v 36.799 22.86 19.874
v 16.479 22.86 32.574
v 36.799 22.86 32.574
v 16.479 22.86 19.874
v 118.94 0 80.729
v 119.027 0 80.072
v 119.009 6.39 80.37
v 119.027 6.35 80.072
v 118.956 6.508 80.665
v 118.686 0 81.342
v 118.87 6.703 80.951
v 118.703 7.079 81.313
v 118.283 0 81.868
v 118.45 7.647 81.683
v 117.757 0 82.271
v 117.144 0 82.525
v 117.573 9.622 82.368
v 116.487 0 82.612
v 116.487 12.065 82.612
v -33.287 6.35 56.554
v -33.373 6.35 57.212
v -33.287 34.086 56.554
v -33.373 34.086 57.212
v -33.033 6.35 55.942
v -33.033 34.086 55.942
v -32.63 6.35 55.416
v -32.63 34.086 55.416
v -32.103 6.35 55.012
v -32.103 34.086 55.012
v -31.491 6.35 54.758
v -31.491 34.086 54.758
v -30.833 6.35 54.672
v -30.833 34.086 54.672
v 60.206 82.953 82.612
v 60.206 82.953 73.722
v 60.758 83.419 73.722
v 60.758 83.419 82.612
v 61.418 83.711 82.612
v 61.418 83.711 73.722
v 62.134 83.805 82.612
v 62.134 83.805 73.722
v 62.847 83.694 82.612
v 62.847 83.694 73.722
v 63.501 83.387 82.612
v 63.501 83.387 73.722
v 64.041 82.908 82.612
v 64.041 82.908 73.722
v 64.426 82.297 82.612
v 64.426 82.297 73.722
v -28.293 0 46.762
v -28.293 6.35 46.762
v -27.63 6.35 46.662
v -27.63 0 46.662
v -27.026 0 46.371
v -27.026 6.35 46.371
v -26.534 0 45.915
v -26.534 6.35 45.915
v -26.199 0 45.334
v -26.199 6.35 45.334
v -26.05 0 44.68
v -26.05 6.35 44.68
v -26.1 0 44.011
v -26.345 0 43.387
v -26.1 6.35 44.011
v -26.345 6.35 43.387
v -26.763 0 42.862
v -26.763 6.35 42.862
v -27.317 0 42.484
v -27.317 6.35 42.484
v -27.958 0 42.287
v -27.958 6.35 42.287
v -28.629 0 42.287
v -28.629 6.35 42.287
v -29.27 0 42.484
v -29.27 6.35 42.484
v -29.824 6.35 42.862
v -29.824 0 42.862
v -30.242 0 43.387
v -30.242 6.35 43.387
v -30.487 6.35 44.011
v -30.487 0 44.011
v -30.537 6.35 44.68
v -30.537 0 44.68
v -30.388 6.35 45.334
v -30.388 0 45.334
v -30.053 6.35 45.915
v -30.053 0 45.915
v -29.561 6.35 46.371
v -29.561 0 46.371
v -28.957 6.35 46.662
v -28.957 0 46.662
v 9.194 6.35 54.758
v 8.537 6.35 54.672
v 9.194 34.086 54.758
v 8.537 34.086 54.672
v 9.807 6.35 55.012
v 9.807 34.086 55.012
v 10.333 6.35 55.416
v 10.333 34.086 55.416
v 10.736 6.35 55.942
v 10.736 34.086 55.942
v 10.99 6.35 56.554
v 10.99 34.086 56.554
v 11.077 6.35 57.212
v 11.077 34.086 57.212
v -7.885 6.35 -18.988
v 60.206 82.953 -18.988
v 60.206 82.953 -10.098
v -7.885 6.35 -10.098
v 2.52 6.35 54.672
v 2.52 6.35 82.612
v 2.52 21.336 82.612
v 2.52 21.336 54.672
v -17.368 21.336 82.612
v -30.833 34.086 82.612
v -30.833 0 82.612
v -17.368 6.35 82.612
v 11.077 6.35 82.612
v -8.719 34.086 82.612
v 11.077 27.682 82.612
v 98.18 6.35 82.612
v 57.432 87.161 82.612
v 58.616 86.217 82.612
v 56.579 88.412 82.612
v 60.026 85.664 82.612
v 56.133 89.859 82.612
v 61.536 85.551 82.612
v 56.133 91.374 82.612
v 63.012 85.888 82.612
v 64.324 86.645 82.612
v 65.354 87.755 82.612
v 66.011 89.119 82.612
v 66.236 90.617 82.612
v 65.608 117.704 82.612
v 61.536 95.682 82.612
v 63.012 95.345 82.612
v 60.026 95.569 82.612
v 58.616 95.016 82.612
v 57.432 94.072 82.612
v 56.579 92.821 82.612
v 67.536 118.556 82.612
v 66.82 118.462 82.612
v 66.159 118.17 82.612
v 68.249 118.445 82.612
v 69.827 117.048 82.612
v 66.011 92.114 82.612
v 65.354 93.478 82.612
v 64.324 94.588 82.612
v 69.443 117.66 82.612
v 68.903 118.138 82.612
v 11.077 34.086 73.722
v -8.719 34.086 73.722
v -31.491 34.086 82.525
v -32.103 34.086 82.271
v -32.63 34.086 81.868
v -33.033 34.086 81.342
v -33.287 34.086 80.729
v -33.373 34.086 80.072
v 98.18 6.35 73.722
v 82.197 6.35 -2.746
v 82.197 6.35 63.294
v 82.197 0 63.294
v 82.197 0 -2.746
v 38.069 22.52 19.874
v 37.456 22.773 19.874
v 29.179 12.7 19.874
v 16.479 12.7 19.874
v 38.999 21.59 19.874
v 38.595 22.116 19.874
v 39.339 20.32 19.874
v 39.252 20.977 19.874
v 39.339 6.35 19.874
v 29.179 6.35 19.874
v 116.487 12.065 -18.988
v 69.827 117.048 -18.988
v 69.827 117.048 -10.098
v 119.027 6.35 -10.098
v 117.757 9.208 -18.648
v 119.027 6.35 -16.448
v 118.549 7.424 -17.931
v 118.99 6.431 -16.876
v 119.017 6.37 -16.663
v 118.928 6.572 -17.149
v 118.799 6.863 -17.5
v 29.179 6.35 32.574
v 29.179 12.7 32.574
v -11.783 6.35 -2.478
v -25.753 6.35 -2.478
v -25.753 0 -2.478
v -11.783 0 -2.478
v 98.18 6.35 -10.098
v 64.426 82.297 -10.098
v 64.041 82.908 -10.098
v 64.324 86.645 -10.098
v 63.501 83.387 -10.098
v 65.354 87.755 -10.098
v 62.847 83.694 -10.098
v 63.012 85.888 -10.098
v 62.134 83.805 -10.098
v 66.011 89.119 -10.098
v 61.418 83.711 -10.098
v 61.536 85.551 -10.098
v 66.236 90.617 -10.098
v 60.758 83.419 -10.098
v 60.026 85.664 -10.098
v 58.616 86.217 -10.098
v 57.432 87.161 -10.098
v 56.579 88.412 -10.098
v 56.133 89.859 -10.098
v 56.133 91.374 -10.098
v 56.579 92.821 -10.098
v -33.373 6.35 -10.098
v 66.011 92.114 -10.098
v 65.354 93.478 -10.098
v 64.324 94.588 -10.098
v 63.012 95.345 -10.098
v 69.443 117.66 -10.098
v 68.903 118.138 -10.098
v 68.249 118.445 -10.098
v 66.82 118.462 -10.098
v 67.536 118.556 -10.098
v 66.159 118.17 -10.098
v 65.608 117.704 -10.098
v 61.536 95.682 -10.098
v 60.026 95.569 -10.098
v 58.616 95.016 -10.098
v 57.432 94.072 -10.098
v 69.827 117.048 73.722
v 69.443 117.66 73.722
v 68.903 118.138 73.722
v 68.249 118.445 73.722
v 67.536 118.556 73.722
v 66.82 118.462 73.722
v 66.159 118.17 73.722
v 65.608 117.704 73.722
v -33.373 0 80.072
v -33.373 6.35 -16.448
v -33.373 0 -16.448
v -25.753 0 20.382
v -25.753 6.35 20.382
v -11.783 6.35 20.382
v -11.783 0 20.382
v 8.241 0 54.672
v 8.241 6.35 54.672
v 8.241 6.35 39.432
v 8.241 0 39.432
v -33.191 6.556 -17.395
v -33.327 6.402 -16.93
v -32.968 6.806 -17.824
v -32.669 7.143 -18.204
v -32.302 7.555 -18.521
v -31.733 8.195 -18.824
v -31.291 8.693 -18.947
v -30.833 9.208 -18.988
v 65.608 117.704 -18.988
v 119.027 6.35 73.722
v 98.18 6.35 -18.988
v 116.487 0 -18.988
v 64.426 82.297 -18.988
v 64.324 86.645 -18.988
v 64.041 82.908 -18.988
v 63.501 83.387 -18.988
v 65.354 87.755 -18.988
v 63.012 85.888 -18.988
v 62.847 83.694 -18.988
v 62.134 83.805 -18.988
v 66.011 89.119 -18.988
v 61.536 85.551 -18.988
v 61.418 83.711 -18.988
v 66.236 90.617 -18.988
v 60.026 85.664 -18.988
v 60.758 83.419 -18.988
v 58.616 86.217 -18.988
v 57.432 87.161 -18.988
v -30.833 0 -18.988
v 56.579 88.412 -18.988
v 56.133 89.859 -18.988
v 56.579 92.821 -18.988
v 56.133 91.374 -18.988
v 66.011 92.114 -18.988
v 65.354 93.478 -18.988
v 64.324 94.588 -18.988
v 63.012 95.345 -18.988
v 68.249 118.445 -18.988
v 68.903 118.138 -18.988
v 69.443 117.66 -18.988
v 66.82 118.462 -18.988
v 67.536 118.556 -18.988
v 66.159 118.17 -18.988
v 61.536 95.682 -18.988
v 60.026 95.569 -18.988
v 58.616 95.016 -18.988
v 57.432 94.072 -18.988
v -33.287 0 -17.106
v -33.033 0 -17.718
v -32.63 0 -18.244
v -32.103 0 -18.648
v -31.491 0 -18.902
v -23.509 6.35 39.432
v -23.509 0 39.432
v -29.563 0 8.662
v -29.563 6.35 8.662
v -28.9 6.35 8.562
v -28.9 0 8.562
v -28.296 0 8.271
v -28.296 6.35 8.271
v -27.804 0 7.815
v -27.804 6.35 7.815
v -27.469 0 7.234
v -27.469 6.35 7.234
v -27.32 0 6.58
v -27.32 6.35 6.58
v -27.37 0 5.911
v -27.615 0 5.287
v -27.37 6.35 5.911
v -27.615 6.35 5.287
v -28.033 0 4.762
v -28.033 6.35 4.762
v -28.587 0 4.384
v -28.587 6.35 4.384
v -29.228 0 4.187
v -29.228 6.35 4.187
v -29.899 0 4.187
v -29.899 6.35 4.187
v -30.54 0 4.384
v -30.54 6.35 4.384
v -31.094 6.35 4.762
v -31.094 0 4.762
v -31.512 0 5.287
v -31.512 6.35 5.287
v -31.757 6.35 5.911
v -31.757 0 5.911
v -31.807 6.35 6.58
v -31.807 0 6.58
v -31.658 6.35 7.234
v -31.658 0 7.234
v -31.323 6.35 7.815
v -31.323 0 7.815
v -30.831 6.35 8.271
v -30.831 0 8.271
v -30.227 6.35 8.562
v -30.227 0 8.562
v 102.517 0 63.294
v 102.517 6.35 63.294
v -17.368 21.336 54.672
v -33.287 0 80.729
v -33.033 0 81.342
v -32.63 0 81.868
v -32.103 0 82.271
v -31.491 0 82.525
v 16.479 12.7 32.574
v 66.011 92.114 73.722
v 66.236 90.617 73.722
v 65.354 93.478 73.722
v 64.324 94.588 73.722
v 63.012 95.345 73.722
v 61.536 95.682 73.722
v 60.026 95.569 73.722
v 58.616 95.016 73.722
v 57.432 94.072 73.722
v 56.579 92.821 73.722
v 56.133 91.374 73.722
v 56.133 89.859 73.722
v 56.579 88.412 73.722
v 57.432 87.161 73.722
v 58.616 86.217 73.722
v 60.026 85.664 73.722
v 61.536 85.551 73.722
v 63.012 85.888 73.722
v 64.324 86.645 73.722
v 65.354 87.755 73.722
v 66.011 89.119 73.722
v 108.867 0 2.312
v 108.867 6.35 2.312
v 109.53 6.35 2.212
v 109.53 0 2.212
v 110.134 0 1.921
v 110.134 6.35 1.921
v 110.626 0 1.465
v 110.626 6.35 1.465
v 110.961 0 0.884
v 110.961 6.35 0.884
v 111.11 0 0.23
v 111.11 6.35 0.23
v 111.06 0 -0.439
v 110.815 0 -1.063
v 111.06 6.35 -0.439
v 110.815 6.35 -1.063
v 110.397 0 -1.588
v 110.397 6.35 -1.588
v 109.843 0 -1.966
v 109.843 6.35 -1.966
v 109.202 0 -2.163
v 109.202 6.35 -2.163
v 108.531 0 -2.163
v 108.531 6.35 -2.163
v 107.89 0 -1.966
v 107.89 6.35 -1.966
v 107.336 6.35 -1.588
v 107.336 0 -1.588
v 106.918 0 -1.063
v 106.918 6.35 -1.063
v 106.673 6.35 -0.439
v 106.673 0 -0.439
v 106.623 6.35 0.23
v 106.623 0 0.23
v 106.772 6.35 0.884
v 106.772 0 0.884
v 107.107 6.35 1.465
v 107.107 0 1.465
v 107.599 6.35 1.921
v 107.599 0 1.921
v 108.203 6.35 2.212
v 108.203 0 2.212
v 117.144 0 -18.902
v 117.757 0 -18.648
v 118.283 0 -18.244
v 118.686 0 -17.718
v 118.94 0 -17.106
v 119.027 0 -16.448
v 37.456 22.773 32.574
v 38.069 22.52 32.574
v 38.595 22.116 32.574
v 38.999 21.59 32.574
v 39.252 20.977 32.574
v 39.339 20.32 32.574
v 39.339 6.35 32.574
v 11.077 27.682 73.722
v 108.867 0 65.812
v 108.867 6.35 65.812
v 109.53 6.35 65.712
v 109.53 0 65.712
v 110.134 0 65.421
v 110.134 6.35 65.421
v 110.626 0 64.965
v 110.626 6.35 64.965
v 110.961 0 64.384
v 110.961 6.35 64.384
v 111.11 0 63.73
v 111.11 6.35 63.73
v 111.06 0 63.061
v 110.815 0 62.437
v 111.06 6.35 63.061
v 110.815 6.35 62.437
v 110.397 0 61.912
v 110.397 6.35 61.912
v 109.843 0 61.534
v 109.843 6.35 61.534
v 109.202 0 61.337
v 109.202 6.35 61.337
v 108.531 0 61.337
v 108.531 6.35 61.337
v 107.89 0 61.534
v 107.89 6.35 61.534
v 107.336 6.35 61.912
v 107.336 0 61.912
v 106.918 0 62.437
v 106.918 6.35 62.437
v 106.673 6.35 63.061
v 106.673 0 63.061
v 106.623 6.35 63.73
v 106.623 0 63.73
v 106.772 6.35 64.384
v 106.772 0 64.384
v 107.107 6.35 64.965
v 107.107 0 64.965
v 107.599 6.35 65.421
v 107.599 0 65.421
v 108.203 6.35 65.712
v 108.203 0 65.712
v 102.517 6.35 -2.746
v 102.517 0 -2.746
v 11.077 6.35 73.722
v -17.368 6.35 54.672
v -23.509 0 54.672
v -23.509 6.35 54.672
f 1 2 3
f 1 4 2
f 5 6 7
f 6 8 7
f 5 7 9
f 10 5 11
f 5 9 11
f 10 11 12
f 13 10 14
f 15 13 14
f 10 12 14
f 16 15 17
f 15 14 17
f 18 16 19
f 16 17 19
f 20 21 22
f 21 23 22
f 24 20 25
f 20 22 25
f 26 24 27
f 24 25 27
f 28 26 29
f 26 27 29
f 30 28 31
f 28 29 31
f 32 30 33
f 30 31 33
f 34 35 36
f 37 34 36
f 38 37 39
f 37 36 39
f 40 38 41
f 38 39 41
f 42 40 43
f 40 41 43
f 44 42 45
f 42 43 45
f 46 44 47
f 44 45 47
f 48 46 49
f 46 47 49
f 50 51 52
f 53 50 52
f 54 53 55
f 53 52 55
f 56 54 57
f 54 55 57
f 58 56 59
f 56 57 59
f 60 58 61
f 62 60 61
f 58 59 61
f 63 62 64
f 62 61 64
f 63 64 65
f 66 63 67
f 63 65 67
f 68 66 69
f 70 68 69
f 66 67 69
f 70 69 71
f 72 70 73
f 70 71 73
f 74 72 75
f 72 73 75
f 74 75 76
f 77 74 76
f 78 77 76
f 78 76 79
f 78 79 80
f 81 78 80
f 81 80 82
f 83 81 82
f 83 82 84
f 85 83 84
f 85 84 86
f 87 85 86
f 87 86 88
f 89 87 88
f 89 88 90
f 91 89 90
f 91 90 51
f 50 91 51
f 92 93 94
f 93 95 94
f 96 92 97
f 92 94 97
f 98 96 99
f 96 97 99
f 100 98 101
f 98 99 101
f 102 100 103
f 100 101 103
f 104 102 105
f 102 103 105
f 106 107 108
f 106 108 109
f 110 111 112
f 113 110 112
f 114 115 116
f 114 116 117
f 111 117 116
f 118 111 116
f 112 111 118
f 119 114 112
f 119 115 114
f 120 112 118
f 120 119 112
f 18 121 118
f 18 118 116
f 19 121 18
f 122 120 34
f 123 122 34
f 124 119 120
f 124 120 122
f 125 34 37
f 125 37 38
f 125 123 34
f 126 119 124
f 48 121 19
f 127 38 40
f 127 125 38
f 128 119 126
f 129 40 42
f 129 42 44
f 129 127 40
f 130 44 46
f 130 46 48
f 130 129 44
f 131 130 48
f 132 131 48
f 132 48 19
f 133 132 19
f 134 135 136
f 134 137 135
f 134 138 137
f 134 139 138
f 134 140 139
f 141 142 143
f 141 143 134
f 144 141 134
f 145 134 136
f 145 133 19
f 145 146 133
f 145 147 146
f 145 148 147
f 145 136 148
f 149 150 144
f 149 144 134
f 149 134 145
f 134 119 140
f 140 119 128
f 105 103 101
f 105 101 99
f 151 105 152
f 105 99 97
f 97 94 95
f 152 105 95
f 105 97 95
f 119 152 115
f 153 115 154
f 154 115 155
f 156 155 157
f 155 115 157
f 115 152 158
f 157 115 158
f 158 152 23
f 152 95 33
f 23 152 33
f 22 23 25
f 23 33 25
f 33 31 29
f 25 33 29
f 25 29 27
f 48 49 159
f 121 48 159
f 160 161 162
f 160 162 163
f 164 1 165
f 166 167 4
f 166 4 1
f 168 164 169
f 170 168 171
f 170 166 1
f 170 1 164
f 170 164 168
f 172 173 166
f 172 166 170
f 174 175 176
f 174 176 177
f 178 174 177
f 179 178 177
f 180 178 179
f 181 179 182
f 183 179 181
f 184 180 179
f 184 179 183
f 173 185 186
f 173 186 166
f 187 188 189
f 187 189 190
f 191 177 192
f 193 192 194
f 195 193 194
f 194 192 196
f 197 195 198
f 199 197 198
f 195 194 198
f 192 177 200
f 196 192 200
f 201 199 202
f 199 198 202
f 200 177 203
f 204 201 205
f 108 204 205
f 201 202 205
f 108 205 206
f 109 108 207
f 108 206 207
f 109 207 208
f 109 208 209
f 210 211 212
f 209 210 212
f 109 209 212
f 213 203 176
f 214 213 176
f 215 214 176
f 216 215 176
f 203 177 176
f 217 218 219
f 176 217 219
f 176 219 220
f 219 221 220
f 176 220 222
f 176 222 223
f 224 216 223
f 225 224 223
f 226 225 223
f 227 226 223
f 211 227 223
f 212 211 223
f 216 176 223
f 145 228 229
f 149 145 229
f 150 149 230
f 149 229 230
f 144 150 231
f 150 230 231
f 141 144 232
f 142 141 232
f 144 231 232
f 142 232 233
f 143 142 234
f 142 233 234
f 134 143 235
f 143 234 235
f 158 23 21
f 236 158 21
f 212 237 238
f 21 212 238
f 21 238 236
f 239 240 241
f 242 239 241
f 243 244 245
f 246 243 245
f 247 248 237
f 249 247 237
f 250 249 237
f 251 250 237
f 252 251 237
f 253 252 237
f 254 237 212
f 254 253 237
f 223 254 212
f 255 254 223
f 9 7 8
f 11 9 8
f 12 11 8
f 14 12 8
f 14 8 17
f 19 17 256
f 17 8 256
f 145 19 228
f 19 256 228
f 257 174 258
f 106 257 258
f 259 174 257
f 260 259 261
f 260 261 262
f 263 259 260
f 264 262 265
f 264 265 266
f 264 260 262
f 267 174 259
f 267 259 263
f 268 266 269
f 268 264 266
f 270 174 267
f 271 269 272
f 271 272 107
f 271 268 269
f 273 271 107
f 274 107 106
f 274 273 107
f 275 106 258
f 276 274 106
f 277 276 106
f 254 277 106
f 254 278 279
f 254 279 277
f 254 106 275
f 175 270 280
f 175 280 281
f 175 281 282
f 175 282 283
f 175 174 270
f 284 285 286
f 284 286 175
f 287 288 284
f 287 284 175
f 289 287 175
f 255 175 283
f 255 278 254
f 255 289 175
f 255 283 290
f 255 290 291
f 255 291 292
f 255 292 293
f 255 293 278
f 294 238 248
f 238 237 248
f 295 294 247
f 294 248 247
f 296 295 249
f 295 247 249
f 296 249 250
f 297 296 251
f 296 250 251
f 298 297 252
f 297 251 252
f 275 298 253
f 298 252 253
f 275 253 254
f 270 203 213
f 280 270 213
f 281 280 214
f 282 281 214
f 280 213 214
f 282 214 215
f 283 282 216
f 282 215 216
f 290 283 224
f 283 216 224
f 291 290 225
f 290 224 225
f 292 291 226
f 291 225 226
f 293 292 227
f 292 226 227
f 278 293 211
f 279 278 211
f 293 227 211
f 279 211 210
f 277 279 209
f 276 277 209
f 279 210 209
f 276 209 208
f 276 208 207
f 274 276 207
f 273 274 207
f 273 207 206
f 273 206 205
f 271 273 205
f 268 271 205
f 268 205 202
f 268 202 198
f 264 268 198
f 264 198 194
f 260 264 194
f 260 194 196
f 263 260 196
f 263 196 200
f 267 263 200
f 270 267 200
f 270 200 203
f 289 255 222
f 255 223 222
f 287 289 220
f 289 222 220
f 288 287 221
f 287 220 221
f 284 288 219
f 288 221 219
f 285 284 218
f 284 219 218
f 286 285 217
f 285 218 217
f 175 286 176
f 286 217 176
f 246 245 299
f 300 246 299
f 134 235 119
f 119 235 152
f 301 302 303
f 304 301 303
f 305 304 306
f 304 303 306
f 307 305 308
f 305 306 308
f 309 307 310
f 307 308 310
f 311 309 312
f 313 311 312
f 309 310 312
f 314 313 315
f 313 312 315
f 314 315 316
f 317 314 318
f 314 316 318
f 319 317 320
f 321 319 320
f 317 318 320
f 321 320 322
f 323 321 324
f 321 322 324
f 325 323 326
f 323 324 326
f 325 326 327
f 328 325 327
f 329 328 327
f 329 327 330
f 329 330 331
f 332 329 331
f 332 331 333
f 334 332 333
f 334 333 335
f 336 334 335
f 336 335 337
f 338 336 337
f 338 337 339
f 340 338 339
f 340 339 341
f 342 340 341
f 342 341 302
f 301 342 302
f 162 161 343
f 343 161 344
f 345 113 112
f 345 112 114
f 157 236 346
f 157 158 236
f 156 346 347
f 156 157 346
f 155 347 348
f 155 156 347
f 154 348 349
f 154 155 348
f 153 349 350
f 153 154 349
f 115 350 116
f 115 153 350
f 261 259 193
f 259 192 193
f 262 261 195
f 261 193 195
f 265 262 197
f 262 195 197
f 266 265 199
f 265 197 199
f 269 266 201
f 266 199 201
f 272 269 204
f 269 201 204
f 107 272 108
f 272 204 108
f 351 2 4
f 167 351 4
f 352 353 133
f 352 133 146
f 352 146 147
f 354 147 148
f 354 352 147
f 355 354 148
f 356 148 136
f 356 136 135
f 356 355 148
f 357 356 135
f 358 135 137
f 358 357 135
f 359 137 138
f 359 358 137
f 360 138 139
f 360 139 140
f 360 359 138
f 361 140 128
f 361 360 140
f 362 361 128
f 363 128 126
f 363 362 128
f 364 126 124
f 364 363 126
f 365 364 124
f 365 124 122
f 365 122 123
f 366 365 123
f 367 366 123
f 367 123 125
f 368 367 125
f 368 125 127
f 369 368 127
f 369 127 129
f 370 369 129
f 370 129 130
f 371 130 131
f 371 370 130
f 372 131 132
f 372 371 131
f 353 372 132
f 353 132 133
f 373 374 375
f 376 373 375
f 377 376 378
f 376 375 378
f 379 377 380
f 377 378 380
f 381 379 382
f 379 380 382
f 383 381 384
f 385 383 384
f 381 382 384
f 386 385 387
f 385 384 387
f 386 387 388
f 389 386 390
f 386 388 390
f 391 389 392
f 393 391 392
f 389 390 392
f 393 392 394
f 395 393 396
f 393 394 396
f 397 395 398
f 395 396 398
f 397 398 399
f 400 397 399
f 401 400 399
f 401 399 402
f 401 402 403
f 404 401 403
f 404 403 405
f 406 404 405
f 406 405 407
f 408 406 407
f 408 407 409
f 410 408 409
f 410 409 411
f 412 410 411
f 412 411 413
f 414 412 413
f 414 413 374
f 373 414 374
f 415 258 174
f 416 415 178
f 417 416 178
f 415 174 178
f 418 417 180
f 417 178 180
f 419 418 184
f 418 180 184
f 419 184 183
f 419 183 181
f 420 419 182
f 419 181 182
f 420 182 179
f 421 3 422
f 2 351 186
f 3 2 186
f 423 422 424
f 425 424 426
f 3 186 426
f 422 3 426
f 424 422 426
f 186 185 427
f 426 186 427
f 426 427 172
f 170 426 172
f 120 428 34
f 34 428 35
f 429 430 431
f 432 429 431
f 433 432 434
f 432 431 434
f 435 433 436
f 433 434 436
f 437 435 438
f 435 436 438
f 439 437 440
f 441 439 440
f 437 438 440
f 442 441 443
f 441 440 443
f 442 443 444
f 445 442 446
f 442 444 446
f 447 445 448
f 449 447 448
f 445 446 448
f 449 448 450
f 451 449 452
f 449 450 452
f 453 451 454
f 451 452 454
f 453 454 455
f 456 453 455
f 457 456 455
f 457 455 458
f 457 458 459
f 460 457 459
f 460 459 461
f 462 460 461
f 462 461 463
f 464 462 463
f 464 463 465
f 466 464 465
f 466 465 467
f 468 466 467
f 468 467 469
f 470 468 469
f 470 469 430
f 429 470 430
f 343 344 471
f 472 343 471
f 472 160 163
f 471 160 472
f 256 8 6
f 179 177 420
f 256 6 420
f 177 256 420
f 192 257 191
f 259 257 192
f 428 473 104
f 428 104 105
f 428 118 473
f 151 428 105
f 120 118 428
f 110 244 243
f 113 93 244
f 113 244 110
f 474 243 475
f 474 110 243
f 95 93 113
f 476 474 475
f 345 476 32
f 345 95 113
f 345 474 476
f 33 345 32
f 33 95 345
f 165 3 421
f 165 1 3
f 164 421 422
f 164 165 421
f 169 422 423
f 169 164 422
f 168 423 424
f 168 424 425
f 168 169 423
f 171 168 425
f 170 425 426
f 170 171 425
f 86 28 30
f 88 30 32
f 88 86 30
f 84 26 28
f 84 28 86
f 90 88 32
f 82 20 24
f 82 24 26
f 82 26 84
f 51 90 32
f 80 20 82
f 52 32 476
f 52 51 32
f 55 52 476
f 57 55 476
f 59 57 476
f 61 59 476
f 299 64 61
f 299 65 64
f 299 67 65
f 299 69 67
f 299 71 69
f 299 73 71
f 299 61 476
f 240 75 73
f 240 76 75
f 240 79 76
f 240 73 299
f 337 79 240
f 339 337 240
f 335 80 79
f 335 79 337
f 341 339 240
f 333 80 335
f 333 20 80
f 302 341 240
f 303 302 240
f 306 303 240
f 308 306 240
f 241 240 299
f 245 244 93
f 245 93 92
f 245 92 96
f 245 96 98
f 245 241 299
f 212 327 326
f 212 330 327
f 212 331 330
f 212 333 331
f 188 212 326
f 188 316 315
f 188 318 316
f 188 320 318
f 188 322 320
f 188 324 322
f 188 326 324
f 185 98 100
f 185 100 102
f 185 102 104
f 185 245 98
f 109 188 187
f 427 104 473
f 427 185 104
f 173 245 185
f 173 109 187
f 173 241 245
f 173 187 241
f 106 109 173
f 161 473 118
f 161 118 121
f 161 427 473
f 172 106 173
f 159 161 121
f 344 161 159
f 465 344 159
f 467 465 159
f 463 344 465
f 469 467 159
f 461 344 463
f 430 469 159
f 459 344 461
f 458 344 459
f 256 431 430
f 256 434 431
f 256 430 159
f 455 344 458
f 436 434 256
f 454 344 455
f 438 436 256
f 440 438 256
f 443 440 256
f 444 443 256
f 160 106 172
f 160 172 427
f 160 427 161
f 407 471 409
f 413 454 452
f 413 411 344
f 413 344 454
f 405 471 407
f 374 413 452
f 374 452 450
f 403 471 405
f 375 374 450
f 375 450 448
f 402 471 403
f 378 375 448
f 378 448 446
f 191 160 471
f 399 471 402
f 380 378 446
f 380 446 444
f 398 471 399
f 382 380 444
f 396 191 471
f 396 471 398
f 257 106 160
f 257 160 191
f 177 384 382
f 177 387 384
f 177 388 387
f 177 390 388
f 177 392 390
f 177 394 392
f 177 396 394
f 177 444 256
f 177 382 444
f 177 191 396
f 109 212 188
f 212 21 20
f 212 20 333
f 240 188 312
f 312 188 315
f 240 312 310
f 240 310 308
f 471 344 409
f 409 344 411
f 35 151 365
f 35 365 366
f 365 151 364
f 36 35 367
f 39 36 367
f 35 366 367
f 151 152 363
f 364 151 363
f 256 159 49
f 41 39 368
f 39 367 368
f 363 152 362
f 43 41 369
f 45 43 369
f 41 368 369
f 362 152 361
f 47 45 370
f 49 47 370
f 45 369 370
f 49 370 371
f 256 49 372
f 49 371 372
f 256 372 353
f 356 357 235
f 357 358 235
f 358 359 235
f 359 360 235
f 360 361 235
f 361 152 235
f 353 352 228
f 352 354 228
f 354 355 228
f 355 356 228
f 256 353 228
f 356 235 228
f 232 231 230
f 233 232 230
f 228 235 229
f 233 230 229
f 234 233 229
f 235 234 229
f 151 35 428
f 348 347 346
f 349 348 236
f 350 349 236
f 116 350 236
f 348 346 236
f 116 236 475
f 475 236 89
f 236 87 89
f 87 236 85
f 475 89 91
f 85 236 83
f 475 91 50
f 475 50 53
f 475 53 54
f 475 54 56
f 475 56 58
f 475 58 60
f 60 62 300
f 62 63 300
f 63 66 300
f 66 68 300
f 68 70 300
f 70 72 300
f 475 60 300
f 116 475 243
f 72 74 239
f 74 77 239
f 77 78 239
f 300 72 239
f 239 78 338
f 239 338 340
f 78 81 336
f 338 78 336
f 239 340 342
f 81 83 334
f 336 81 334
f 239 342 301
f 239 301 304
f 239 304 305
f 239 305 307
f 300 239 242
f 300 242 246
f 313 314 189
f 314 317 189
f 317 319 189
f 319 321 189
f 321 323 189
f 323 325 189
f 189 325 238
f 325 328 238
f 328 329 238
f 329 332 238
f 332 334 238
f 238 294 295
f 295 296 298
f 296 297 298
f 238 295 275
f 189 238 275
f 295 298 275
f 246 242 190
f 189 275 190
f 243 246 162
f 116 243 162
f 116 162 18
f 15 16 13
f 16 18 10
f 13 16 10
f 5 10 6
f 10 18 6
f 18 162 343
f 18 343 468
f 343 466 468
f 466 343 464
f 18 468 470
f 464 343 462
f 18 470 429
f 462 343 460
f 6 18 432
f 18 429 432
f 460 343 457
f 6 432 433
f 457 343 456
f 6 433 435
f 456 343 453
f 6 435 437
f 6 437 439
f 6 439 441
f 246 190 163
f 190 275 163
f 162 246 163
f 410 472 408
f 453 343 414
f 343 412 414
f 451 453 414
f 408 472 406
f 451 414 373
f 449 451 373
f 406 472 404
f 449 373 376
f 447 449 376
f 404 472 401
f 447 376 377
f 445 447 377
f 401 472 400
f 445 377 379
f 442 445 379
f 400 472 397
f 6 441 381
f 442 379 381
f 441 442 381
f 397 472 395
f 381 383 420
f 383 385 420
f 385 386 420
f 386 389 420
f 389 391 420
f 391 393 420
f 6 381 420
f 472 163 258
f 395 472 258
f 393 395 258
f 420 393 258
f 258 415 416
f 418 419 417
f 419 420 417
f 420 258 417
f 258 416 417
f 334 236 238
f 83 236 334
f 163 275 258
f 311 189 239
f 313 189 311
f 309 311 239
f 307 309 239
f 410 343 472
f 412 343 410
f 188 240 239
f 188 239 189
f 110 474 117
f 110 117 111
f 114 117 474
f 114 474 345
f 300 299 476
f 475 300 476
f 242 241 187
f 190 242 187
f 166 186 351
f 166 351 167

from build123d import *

# Parameters (mm, degrees)
SKETCH2_W               = 152.4
SKETCH2_H               = 101.6
BOSS_EXTRUDE1_DEPTH     = 6.35
BOSS_EXTRUDE2_DEPTH     = 8.89
FILLET1_R               = 2.54
SKETCH5_R               = 5.08
CUT_EXTRUDE1_DEPTH      = 192.880455786
MIRROR1_START           = 73.721650485
MIRROR1_OUTLINE_R       = 5.08
MIRROR1_DEPTH           = 8.89
SKETCH12_W              = 44.45
SKETCH12_H              = 27.736089271
BOSS_EXTRUDE4_DEPTH     = 19.05
BOSS_EXTRUDE5_DEPTH     = 8.89
CUT_EXTRUDE4_DEPTH      = 19.05
CUT_EXTRUDE4_DEPTH_BACK = 192.880455786
SKETCH12_4_W            = 19.8882
SKETCH12_4_H            = 14.986
CUT_EXTRUDE5_DEPTH      = 6.35
SKETCH18_W              = 20.32
SKETCH18_H              = 66.04
CUT_EXTRUDE6_DEPTH      = 6.35
SKETCH19_W              = 13.97
SKETCH19_H              = 22.86
CUT_EXTRUDE7_DEPTH      = 184.254753535
SKETCH20_R              = 2.25
SKETCH20_R_2            = 1.1303
CUT_EXTRUDE8_DEPTH      = 184.254753535
SKETCH21_W              = 10.16
SKETCH21_H              = 12.7
BOSS_EXTRUDE6_DEPTH     = 16.51
SKETCH22_W              = 12.7
SKETCH22_H              = 10.16
BOSS_EXTRUDE7_DEPTH     = 22.86
FILLET2_R               = 2.54
FILLET3_R               = 2.54


# Read off the part's stored shape, not the designer's step: Mirror1
with BuildPart() as part:
    # Sketch2 → Boss-Extrude1 (new body)
    with BuildSketch(Plane(origin=(0, 0, 0), x_dir=(1, 0, 0), z_dir=(0, 1, 0))):
        with Locations((42.826537217, -31.811650485)):
            Rectangle(SKETCH2_W, SKETCH2_H)
    extrude(amount=BOSS_EXTRUDE1_DEPTH)

    # Sketch4 → Boss-Extrude2 (add)
    with BuildSketch(Plane(origin=(0, 0, -18.988349515), x_dir=(-1, 0, 0), z_dir=(0, 0, -1))):
        Polygon((-98.179788203, 6.35), (-62.824718494, 85.898906846), (7.885420925, 6.35), (33.373462783, 6.35), (-68.226537217, 120.65), (-119.026537217, 6.35), align=None)
    extrude(amount=-BOSS_EXTRUDE2_DEPTH)

    # Fillet1
    fillet1_edges = [part.edges().sort_by_distance(p)[0] for p in [
        (62.824718494, 85.898906846, -14.543349515),
        (68.226537217, 120.65, -14.543349515),
    ]]
    fillet(fillet1_edges, radius=FILLET1_R)

    # Sketch5 → Cut-Extrude1 (cut, through all)
    with BuildSketch(Plane.XY.offset(-10.098349515)):
        with Locations((61.15629472, 90.616520913)):
            Circle(SKETCH5_R)
    extrude(amount=-CUT_EXTRUDE1_DEPTH, mode=Mode.SUBTRACT)

    # Mirror1 outline → Mirror1 (add)
    with BuildSketch(Plane.XY.offset(MIRROR1_START)):
        with BuildLine():
            ThreePointArc((60.206056328, 82.952911909), (62.494616288, 83.775286431), (64.425557331, 82.297019462))
            Line((64.425557331, 82.297019462), (98.179788203, 6.35))
            Line((98.179788203, 6.35), (119.026537217, 6.35))
            Line((119.026537217, 6.35), (69.827376054, 117.048112617))
            ThreePointArc((69.827376054, 117.048112617), (67.89643501, 118.526379585), (65.607875051, 117.704005063))
            Line((65.607875051, 117.704005063), (-33.373462783, 6.35))
            Line((-33.373462783, 6.35), (-7.885420925, 6.35))
            Line((-7.885420925, 6.35), (60.206056328, 82.952911909))
        make_face()
        with Locations((61.15629472, 90.616520913)):
            Circle(MIRROR1_OUTLINE_R, mode=Mode.SUBTRACT)
    extrude(amount=MIRROR1_DEPTH)

    # Sketch12 → Boss-Extrude4 (add)
    with BuildSketch(Plane(origin=(0, 0, 73.721650485), x_dir=(-1, 0, 0), z_dir=(0, 0, -1))):
        with Locations((11.148462783, 20.218044636)):
            Rectangle(SKETCH12_W, SKETCH12_H)
    extrude(amount=BOSS_EXTRUDE4_DEPTH)

    # Sketch15 → Boss-Extrude5 (add)
    with BuildSketch(Plane.XY.offset(73.721650485)):
        Polygon((-33.373462783, 34.086089271), (-33.373462783, 6.35), (-8.719161209, 34.086089271), align=None)
        Polygon((11.076537217, 27.682202909), (-7.885420925, 6.35), (11.076537217, 6.35), align=None)
    extrude(amount=BOSS_EXTRUDE5_DEPTH)

    # Sketch12<4> → Cut-Extrude4 (cut, two sides: drawn at the far end of the back side and taken through both)
    with BuildSketch(Plane(origin=(0, 0, 73.721650485), x_dir=(-1, 0, 0), z_dir=(0, 0, -1)).offset(-CUT_EXTRUDE4_DEPTH_BACK)):
        with Locations((7.42370528, 13.843)):
            Rectangle(SKETCH12_4_W, SKETCH12_4_H)
    extrude(amount=CUT_EXTRUDE4_DEPTH + CUT_EXTRUDE4_DEPTH_BACK, mode=Mode.SUBTRACT)

    # Sketch17 → Cut-Extrude5 (cut)
    with BuildSketch(Plane(origin=(0, 6.35, 0), x_dir=(1, 0, 0), z_dir=(0, 1, 0))):
        Polygon((-23.508558608, -40.828650485), (-9.633558608, -40.828650485), (-5.633558608, -40.828650485), (8.241441392, -40.828650485), (8.241441392, -39.431650485), (-23.508558608, -39.431650485), align=None)
        Polygon((-5.633558608, -40.828650485), (-9.633558608, -40.828650485), (-23.508558608, -40.828650485), (-23.508558608, -54.671650485), (-17.36780528, -54.671650485), (2.52039472, -54.671650485), (8.241441392, -54.671650485), (8.241441392, -40.828650485), align=None)
    extrude(amount=-CUT_EXTRUDE5_DEPTH, mode=Mode.SUBTRACT)

    # Sketch18 → Cut-Extrude6 (cut)
    with BuildSketch(Plane(origin=(0, 6.35, 0), x_dir=(1, 0, 0), z_dir=(0, 1, 0))):
        with Locations((92.356537217, -30.274439416)):
            Rectangle(SKETCH18_W, SKETCH18_H)
    extrude(amount=-CUT_EXTRUDE6_DEPTH, mode=Mode.SUBTRACT)

    # Sketch19 → Cut-Extrude7 (cut, through all)
    with BuildSketch(Plane(origin=(0, 6.35, 0), x_dir=(1, 0, 0), z_dir=(0, 1, 0))):
        with Locations((-18.768462783, -8.951650485)):
            Rectangle(SKETCH19_W, SKETCH19_H)
    extrude(amount=-CUT_EXTRUDE7_DEPTH, mode=Mode.SUBTRACT)

    # Sketch20 → Cut-Extrude8 (cut, through all)
    # profile 1 of 8: a face of its own
    with BuildSketch(Plane(origin=(0, 6.35, 0), x_dir=(1, 0, 0), z_dir=(0, 1, 0))):
        with Locations(Location((-29.563462783, -6.411650485, 0), (0, 0, 270))):
            Circle(SKETCH20_R)
        with Locations((-29.563462783, -6.411650485)):
            Circle(SKETCH20_R_2, mode=Mode.SUBTRACT)
    # profile 2 of 8: a face of its own
    with BuildSketch(Plane(origin=(0, 6.35, 0), x_dir=(1, 0, 0), z_dir=(0, 1, 0))):
        with Locations((-29.563462783, -6.411650485)):
            Circle(SKETCH20_R_2)
    # profile 3 of 8: a face of its own
    with BuildSketch(Plane(origin=(0, 6.35, 0), x_dir=(1, 0, 0), z_dir=(0, 1, 0))):
        with Locations(Location((-28.293462783, -44.511650485, 0), (0, 0, 270))):
            Circle(SKETCH20_R)
        with Locations((-28.293462783, -44.511650485)):
            Circle(SKETCH20_R_2, mode=Mode.SUBTRACT)
    # profile 4 of 8: a face of its own
    with BuildSketch(Plane(origin=(0, 6.35, 0), x_dir=(1, 0, 0), z_dir=(0, 1, 0))):
        with Locations((-28.293462783, -44.511650485)):
            Circle(SKETCH20_R_2)
    # profile 5 of 8: a face of its own
    with BuildSketch(Plane(origin=(0, 6.35, 0), x_dir=(1, 0, 0), z_dir=(0, 1, 0))):
        with Locations(Location((108.866537217, -0.061650485, 0), (0, 0, 270))):
            Circle(SKETCH20_R)
        with Locations((108.866537217, -0.061650485)):
            Circle(SKETCH20_R_2, mode=Mode.SUBTRACT)
    # profile 6 of 8: a face of its own
    with BuildSketch(Plane(origin=(0, 6.35, 0), x_dir=(1, 0, 0), z_dir=(0, 1, 0))):
        with Locations((108.866537217, -0.061650485)):
            Circle(SKETCH20_R_2)
    # profile 7 of 8: a face of its own
    with BuildSketch(Plane(origin=(0, 6.35, 0), x_dir=(1, 0, 0), z_dir=(0, 1, 0))):
        with Locations(Location((108.866537217, -63.561650485, 0), (0, 0, 270))):
            Circle(SKETCH20_R)
        with Locations((108.866537217, -63.561650485)):
            Circle(SKETCH20_R_2, mode=Mode.SUBTRACT)
    # profile 8 of 8: a face of its own
    with BuildSketch(Plane(origin=(0, 6.35, 0), x_dir=(1, 0, 0), z_dir=(0, 1, 0))):
        with Locations((108.866537217, -63.561650485)):
            Circle(SKETCH20_R_2)
    extrude(amount=-CUT_EXTRUDE8_DEPTH, mode=Mode.SUBTRACT)

    # Sketch21 → Boss-Extrude6 (add)
    with BuildSketch(Plane(origin=(0, 6.35, 0), x_dir=(1, 0, 0), z_dir=(0, 1, 0))):
        with Locations((34.258952171, -26.223650485)):
            Rectangle(SKETCH21_W, SKETCH21_H)
    extrude(amount=BOSS_EXTRUDE6_DEPTH)

    # Sketch22 → Boss-Extrude7 (add)
    with BuildSketch(Plane(origin=(39.338952171, 0, 0), x_dir=(0, 0, -1), z_dir=(1, 0, 0))):
        with Locations((-26.223650485, 17.78)):
            Rectangle(SKETCH22_W, SKETCH22_H)
    extrude(amount=-BOSS_EXTRUDE7_DEPTH)

    # Fillet2
    fillet2_edges = [part.edges().sort_by_distance(p)[0] for p in [
        (39.338952171, 22.86, 26.223650485),
    ]]
    fillet(fillet2_edges, radius=FILLET2_R)

    # Fillet3
    fillet3_edges = [part.edges().sort_by_distance(p)[0] for p in [
        (11.076537217, 20.218044635, 54.671650485),
        (-33.373462783, 20.218044635, 54.671650485),
        (-33.373462783, 3.175, -18.988349515),
        (119.026537217, 3.175, -18.988349515),
        (119.026537217, 3.175, 82.611650485),
        (-33.373462783, 17.043044635, 82.611650485),
    ]]
    fillet(fillet3_edges, radius=FILLET3_R)


solid = part.part
